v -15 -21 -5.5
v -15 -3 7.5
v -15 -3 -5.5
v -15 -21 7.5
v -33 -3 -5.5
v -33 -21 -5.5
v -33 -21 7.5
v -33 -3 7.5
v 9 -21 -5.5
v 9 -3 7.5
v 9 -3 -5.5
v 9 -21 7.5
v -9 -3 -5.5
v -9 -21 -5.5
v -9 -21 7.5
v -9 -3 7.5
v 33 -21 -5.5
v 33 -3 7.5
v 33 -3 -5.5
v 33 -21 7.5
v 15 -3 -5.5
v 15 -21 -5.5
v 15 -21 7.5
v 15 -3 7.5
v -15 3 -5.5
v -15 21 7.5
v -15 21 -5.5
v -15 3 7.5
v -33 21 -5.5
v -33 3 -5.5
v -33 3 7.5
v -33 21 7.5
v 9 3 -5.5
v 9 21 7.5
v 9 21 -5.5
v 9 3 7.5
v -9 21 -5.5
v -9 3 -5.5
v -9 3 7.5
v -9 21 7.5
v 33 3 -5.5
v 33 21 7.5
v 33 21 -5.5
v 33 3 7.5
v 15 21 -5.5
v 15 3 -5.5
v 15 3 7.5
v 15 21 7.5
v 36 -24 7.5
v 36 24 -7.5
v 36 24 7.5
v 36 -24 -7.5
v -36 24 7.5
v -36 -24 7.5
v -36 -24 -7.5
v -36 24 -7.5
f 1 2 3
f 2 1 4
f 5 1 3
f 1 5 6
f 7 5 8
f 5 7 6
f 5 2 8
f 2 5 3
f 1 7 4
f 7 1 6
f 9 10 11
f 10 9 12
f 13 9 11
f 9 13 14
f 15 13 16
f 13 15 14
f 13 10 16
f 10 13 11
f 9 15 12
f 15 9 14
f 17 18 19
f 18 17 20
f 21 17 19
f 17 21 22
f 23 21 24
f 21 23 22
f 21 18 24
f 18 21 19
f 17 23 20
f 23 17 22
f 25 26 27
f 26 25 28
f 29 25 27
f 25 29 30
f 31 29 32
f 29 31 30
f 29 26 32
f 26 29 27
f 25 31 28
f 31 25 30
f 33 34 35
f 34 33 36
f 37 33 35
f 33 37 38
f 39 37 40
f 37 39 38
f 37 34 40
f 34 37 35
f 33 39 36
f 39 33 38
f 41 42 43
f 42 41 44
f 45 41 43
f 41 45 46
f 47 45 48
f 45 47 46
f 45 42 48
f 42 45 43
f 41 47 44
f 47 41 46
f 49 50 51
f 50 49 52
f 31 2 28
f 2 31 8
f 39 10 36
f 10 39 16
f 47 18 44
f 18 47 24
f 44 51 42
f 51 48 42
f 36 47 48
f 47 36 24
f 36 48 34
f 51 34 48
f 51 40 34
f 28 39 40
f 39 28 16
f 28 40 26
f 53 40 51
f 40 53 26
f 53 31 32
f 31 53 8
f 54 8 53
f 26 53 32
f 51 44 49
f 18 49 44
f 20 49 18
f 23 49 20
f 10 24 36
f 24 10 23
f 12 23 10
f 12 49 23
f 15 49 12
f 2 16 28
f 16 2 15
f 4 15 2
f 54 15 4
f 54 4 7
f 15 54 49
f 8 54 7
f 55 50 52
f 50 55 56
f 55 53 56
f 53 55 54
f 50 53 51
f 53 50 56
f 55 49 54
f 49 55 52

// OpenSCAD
$fn = 32;

// ----------------------------------------------------------------------
// Pocket plate 72 x 48 x 15
// 2 x 3 pockets 18 mm square, 13 mm deep
// ----------------------------------------------------------------------

// --- parameters (mm) ---
thickness = 15;  // plate thickness
floor_t = 2;     // material left under each pocket
pocket = 18;     // pocket side length
pitch_x = 24;    // pocket pitch along X
pitch_y = 24;    // pocket pitch along Y
cols = 3;        // pockets per row
rows = 2;        // rows of pockets

// --- derived feature positions (mm) ---
depth = thickness - floor_t;        // = 13   pocket depth, down to the floor
span_x = (cols - 1) * pitch_x;      // = 48   distance between outer pockets
span_y = (rows - 1) * pitch_y;      // = 24   distance between outer pocket rows
origin_x = -span_x / 2;             // = -24   X of the first pocket
origin_y = -span_y / 2;             // = -12   Y of the first pocket
plate = [span_x + pocket + 6, span_y + pocket + 6, thickness];  // = [72, 48, 15]   overall size: pockets plus 3 mm of wall on each side
feature_centers = [
  [origin_x + 0 * pitch_x, origin_y + 0 * pitch_y],
  [origin_x + 1 * pitch_x, origin_y + 0 * pitch_y],
  [origin_x + 2 * pitch_x, origin_y + 0 * pitch_y],
  [origin_x + 0 * pitch_x, origin_y + 1 * pitch_y],
  [origin_x + 1 * pitch_x, origin_y + 1 * pitch_y],
  [origin_x + 2 * pitch_x, origin_y + 1 * pitch_y]
];   // pocket centres, used verbatim by the cutter loop

// plate outline, then one pocket per centre in feature_centers
difference() {
  cube(plate, center = true);
  for (centre = feature_centers)
    translate([centre[0] - pocket / 2, centre[1] - pocket / 2, plate[2] / 2 - depth])
      cube([pocket, pocket, depth + 1]);  // centred on the declared pocket centre
}
